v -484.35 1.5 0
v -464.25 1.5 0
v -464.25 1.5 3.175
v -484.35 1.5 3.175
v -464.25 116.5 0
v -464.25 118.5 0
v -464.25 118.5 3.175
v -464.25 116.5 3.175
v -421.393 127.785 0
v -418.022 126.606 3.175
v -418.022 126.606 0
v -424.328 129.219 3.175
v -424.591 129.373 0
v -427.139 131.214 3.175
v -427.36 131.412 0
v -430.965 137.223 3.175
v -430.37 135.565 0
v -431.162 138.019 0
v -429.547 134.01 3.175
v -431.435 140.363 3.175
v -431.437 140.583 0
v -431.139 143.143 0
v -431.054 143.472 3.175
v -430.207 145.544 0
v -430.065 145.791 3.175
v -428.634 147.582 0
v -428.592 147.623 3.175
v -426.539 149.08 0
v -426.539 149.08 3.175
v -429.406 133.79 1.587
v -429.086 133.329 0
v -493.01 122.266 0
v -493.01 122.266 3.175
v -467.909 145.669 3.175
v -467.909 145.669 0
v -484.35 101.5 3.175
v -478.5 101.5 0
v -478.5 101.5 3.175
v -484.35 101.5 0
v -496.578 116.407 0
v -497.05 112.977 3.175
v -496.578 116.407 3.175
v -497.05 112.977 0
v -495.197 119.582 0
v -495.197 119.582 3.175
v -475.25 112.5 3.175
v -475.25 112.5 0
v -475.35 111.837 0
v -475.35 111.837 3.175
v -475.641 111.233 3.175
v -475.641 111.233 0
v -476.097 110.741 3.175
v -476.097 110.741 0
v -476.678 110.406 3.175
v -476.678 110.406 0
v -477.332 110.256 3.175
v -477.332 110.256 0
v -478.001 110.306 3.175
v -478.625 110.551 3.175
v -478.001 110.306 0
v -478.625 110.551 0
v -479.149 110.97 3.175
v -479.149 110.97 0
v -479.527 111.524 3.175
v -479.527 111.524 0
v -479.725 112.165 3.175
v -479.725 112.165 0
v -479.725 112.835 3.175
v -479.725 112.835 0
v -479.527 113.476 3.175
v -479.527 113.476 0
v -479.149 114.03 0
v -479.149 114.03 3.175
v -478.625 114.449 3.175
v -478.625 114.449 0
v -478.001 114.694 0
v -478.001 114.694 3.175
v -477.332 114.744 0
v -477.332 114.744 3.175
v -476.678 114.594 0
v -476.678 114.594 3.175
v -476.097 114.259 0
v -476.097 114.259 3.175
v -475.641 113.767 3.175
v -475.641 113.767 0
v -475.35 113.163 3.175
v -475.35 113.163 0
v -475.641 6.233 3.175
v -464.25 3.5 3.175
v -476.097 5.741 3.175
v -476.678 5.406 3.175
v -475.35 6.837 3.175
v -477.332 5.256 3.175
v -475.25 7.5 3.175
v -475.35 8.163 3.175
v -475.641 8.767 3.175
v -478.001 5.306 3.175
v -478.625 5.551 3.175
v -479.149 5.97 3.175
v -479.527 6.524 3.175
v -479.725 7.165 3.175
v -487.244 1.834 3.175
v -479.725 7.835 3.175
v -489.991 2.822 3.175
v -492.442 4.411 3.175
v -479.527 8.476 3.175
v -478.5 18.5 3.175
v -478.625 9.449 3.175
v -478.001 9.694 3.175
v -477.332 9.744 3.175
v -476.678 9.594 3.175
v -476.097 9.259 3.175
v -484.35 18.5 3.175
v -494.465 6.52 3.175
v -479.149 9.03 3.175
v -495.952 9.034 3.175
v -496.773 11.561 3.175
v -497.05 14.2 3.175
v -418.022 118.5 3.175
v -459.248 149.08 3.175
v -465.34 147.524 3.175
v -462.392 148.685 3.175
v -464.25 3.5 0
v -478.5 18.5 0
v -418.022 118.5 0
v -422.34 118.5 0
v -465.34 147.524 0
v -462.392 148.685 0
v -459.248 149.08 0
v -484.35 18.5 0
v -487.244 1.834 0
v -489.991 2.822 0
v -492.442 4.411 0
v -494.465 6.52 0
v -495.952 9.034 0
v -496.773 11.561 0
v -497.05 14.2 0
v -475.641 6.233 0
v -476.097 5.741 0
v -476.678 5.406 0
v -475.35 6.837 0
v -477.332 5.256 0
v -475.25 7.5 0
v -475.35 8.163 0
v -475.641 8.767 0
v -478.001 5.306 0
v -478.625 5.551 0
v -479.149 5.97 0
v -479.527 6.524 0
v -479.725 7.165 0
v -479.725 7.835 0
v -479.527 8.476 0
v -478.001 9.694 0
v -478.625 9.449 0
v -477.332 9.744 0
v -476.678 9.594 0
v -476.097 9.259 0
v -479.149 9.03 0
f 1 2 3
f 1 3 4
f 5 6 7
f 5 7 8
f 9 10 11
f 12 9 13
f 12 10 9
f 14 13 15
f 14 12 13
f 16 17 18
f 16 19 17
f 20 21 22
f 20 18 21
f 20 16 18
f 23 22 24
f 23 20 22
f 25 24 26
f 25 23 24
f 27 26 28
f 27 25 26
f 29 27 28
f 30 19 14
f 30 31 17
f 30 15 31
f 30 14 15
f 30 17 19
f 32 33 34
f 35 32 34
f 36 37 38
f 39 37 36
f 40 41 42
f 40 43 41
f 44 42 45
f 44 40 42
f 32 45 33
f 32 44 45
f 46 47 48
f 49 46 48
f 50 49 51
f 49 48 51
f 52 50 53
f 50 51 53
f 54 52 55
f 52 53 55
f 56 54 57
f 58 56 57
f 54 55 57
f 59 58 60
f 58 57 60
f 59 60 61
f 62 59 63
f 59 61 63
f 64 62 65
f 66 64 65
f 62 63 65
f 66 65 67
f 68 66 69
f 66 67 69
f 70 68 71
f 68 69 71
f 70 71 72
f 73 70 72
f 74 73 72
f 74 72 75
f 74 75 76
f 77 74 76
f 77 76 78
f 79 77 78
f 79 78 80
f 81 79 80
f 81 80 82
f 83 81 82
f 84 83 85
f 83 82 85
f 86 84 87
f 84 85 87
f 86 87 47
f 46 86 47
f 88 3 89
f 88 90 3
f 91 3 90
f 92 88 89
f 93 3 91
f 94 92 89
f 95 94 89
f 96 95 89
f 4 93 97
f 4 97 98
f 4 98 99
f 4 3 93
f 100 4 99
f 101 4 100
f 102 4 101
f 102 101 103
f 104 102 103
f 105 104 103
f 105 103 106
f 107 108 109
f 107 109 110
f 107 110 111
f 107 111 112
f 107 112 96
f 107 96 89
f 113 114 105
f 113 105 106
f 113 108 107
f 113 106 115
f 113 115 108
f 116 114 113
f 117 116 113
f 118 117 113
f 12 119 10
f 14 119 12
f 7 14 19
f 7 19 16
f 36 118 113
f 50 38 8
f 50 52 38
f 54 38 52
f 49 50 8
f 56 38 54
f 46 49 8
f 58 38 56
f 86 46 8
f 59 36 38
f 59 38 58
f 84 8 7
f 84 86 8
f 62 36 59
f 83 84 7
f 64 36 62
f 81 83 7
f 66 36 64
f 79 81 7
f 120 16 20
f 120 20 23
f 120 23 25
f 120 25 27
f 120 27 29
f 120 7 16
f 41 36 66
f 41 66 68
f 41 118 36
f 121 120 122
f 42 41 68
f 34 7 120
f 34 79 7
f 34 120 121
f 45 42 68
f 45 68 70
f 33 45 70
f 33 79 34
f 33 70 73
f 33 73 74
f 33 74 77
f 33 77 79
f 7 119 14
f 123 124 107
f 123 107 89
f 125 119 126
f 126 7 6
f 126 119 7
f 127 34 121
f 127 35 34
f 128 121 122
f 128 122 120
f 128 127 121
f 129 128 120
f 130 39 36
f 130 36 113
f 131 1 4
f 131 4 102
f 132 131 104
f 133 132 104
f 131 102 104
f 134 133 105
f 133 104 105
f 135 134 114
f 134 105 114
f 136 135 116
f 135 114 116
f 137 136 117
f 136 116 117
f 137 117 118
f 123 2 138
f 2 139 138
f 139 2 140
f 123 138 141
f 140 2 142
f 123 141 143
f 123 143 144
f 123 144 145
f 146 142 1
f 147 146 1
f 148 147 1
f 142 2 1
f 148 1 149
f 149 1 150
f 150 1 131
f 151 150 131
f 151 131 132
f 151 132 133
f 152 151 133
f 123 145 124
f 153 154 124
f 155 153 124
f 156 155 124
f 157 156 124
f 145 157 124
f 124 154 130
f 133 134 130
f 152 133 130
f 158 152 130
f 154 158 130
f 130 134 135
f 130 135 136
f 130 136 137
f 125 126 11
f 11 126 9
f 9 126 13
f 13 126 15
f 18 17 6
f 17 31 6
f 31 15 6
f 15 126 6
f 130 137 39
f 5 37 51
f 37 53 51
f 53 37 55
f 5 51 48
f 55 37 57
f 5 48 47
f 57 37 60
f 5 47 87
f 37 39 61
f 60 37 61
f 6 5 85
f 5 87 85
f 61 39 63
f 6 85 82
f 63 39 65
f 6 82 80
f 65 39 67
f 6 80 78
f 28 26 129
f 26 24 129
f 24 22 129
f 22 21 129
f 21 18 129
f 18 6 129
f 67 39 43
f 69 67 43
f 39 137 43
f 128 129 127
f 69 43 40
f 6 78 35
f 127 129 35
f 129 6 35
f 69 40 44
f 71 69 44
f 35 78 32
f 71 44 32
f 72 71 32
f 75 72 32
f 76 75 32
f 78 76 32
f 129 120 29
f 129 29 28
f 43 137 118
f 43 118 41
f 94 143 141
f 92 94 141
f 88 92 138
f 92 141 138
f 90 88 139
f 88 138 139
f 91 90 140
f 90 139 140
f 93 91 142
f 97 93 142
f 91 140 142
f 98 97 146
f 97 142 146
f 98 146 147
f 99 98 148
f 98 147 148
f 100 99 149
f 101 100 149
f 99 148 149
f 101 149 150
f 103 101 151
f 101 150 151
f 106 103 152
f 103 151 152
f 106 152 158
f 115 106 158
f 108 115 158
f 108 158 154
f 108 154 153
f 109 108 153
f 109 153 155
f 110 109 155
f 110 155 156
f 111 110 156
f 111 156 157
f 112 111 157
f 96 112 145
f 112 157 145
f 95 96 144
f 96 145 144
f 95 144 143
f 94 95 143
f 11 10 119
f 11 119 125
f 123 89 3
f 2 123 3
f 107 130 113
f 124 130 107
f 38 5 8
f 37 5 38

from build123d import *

# Parameters (mm, degrees)
F_3DSKETCH1_R         = 2.25
BOSS_EXTRUDE1_DEPTH   = 3.175
BOSS_EXTRUDE1_2_DEPTH = 3.175
BOSS_EXTRUDE1_3_DEPTH = 3.175
SKETCH2_W             = 3.175
SKETCH2_H             = 22.959761953
BOSS_EXTRUDE2_DEPTH   = 41.91
SKETCH3_W             = 67.66
SKETCH3_H             = 3.175
SKETCH3_W_2           = 7.05
BOSS_EXTRUDE3_DEPTH   = 7.62
SKETCH4_W             = 3.175
SKETCH4_H             = 30.579761953
BOSS_EXTRUDE4_DEPTH   = 4.318
CUT_EXTRUDE1_DEPTH    = 5.08
FILLET1_R             = 12.7


with BuildPart() as part:
    # 3DSketch1 → Boss-Extrude1 (new body)
    with BuildSketch(Plane(origin=(-464.25, 116.5, 0), x_dir=(-0.27427932364426477, -0.9616500676551969, 0), z_dir=(0, 0, -1))):
        Polygon((-1.923300135, 0.548558647), (0, 0), (18.333231377, 9.589323609), (19.93776542, 15.214976505), (99.754721035, -7.550207357), (98.150186992, -13.175860253), (108.666457645, -30.993563572), (110.58975778, -31.542122219), (117.652450364, -6.779632977), (5.139392449, 25.311047889), align=None)
        with Locations(Location((108.454058413, -17.154582881, 0), (0, 0, 254.080928829))):
            Circle(F_3DSKETCH1_R, mode=Mode.SUBTRACT)
        with Locations(Location((7.480801309, 11.644746102, 0), (0, 0, 254.080928829))):
            Circle(F_3DSKETCH1_R, mode=Mode.SUBTRACT)
    extrude(amount=-BOSS_EXTRUDE1_DEPTH)



with BuildPart() as body_2:
    # 3DSketch1 → Boss-Extrude1 2 (new body)
    with BuildSketch(Plane(origin=(-464.25, 116.5, 0), x_dir=(-0.27427932364426477, -0.9616500676551969, 0), z_dir=(0, 0, -1))):
        Polygon((-24.002556771, 6.845946627), (-1.923300135, 0.548558647), (5.139392449, 25.311047889), (-16.939864187, 31.608435869), align=None)
    extrude(amount=-BOSS_EXTRUDE1_2_DEPTH)


with BuildPart() as body_3:
    # 3DSketch1 → Boss-Extrude1 3 (new body)
    with BuildSketch(Plane(origin=(-464.25, 116.5, 0), x_dir=(-0.27427932364426477, -0.9616500676551969, 0), z_dir=(0, 0, -1))):
        Polygon((-16.939864187, 31.608435869), (5.139392449, 25.311047889), (117.652450364, -6.779632977), (119.586119596, 0), (-15.006194955, 38.388068846), align=None)
    extrude(amount=-BOSS_EXTRUDE1_3_DEPTH)


with BuildPart() as part_1:
    add(part.part)

    add(body_2.part)  # Boss-Extrude2 merges body 2
    # Sketch2 → Boss-Extrude2 (add)
    with BuildSketch(Plane(origin=(-464.25, 0, 0), x_dir=(0, 0, -1), z_dir=(1, 0, 0))):
        with Locations((-1.5875, 129.979880976)):
            Rectangle(SKETCH2_W, SKETCH2_H)
    extrude(amount=BOSS_EXTRUDE2_DEPTH)


    add(body_3.part)  # Boss-Extrude3 merges body 3
    # Sketch3 → Boss-Extrude3 (add)
    with BuildSketch(Plane(origin=(0, 141.459761953, 0), x_dir=(1, 0, 0), z_dir=(0, 1, 0))):
        with Locations((-456.17, -1.5875)):
            Rectangle(SKETCH3_W, SKETCH3_H)
        with Locations((-493.525, -1.5875)):
            Rectangle(SKETCH3_W_2, SKETCH3_H)
    extrude(amount=BOSS_EXTRUDE3_DEPTH)

    # Sketch4 → Boss-Extrude4 (add)
    with BuildSketch(Plane(origin=(-422.34, 0, 0), x_dir=(0, 0, -1), z_dir=(1, 0, 0))):
        with Locations((-1.5875, 133.789880977)):
            Rectangle(SKETCH4_W, SKETCH4_H)
    extrude(amount=BOSS_EXTRUDE4_DEPTH)

    # Sketch5 → Cut-Extrude1 (cut)
    with BuildSketch(Plane.XY.offset(3.175)):
        with BuildLine():
            Line((-426.539082165, 149.079761953), (-418.022, 149.079761953))
            Line((-418.022, 149.079761953), (-418.022, 126.606320753))
            add(Edge.make_bspline(
                [(-418.022, 126.606320753), (-422.206786757, 127.841281747), (-432.70768746, 132.592685738), (-432.363764658, 146.022941569), (-426.539082165, 149.079761953)],
                knots=[0, 0, 0, 0, 0.445070819, 1, 1, 1, 1], degree=3))
        make_face()
        Polygon((-497.05, 118.5), (-464.25, 149.079761953), (-497.05, 149.079761953), align=None)
    extrude(amount=-CUT_EXTRUDE1_DEPTH, mode=Mode.SUBTRACT)

    # Fillet1
    fillet1_edges = [part_1.edges().sort_by_distance(p)[0] for p in [
        (-497.05, 1.5, 1.5875),
        (-464.25, 149.079761953, 1.5875),
        (-497.05, 118.5, 1.5875),
    ]]
    fillet(fillet1_edges, radius=FILLET1_R)


solid = part_1.part
